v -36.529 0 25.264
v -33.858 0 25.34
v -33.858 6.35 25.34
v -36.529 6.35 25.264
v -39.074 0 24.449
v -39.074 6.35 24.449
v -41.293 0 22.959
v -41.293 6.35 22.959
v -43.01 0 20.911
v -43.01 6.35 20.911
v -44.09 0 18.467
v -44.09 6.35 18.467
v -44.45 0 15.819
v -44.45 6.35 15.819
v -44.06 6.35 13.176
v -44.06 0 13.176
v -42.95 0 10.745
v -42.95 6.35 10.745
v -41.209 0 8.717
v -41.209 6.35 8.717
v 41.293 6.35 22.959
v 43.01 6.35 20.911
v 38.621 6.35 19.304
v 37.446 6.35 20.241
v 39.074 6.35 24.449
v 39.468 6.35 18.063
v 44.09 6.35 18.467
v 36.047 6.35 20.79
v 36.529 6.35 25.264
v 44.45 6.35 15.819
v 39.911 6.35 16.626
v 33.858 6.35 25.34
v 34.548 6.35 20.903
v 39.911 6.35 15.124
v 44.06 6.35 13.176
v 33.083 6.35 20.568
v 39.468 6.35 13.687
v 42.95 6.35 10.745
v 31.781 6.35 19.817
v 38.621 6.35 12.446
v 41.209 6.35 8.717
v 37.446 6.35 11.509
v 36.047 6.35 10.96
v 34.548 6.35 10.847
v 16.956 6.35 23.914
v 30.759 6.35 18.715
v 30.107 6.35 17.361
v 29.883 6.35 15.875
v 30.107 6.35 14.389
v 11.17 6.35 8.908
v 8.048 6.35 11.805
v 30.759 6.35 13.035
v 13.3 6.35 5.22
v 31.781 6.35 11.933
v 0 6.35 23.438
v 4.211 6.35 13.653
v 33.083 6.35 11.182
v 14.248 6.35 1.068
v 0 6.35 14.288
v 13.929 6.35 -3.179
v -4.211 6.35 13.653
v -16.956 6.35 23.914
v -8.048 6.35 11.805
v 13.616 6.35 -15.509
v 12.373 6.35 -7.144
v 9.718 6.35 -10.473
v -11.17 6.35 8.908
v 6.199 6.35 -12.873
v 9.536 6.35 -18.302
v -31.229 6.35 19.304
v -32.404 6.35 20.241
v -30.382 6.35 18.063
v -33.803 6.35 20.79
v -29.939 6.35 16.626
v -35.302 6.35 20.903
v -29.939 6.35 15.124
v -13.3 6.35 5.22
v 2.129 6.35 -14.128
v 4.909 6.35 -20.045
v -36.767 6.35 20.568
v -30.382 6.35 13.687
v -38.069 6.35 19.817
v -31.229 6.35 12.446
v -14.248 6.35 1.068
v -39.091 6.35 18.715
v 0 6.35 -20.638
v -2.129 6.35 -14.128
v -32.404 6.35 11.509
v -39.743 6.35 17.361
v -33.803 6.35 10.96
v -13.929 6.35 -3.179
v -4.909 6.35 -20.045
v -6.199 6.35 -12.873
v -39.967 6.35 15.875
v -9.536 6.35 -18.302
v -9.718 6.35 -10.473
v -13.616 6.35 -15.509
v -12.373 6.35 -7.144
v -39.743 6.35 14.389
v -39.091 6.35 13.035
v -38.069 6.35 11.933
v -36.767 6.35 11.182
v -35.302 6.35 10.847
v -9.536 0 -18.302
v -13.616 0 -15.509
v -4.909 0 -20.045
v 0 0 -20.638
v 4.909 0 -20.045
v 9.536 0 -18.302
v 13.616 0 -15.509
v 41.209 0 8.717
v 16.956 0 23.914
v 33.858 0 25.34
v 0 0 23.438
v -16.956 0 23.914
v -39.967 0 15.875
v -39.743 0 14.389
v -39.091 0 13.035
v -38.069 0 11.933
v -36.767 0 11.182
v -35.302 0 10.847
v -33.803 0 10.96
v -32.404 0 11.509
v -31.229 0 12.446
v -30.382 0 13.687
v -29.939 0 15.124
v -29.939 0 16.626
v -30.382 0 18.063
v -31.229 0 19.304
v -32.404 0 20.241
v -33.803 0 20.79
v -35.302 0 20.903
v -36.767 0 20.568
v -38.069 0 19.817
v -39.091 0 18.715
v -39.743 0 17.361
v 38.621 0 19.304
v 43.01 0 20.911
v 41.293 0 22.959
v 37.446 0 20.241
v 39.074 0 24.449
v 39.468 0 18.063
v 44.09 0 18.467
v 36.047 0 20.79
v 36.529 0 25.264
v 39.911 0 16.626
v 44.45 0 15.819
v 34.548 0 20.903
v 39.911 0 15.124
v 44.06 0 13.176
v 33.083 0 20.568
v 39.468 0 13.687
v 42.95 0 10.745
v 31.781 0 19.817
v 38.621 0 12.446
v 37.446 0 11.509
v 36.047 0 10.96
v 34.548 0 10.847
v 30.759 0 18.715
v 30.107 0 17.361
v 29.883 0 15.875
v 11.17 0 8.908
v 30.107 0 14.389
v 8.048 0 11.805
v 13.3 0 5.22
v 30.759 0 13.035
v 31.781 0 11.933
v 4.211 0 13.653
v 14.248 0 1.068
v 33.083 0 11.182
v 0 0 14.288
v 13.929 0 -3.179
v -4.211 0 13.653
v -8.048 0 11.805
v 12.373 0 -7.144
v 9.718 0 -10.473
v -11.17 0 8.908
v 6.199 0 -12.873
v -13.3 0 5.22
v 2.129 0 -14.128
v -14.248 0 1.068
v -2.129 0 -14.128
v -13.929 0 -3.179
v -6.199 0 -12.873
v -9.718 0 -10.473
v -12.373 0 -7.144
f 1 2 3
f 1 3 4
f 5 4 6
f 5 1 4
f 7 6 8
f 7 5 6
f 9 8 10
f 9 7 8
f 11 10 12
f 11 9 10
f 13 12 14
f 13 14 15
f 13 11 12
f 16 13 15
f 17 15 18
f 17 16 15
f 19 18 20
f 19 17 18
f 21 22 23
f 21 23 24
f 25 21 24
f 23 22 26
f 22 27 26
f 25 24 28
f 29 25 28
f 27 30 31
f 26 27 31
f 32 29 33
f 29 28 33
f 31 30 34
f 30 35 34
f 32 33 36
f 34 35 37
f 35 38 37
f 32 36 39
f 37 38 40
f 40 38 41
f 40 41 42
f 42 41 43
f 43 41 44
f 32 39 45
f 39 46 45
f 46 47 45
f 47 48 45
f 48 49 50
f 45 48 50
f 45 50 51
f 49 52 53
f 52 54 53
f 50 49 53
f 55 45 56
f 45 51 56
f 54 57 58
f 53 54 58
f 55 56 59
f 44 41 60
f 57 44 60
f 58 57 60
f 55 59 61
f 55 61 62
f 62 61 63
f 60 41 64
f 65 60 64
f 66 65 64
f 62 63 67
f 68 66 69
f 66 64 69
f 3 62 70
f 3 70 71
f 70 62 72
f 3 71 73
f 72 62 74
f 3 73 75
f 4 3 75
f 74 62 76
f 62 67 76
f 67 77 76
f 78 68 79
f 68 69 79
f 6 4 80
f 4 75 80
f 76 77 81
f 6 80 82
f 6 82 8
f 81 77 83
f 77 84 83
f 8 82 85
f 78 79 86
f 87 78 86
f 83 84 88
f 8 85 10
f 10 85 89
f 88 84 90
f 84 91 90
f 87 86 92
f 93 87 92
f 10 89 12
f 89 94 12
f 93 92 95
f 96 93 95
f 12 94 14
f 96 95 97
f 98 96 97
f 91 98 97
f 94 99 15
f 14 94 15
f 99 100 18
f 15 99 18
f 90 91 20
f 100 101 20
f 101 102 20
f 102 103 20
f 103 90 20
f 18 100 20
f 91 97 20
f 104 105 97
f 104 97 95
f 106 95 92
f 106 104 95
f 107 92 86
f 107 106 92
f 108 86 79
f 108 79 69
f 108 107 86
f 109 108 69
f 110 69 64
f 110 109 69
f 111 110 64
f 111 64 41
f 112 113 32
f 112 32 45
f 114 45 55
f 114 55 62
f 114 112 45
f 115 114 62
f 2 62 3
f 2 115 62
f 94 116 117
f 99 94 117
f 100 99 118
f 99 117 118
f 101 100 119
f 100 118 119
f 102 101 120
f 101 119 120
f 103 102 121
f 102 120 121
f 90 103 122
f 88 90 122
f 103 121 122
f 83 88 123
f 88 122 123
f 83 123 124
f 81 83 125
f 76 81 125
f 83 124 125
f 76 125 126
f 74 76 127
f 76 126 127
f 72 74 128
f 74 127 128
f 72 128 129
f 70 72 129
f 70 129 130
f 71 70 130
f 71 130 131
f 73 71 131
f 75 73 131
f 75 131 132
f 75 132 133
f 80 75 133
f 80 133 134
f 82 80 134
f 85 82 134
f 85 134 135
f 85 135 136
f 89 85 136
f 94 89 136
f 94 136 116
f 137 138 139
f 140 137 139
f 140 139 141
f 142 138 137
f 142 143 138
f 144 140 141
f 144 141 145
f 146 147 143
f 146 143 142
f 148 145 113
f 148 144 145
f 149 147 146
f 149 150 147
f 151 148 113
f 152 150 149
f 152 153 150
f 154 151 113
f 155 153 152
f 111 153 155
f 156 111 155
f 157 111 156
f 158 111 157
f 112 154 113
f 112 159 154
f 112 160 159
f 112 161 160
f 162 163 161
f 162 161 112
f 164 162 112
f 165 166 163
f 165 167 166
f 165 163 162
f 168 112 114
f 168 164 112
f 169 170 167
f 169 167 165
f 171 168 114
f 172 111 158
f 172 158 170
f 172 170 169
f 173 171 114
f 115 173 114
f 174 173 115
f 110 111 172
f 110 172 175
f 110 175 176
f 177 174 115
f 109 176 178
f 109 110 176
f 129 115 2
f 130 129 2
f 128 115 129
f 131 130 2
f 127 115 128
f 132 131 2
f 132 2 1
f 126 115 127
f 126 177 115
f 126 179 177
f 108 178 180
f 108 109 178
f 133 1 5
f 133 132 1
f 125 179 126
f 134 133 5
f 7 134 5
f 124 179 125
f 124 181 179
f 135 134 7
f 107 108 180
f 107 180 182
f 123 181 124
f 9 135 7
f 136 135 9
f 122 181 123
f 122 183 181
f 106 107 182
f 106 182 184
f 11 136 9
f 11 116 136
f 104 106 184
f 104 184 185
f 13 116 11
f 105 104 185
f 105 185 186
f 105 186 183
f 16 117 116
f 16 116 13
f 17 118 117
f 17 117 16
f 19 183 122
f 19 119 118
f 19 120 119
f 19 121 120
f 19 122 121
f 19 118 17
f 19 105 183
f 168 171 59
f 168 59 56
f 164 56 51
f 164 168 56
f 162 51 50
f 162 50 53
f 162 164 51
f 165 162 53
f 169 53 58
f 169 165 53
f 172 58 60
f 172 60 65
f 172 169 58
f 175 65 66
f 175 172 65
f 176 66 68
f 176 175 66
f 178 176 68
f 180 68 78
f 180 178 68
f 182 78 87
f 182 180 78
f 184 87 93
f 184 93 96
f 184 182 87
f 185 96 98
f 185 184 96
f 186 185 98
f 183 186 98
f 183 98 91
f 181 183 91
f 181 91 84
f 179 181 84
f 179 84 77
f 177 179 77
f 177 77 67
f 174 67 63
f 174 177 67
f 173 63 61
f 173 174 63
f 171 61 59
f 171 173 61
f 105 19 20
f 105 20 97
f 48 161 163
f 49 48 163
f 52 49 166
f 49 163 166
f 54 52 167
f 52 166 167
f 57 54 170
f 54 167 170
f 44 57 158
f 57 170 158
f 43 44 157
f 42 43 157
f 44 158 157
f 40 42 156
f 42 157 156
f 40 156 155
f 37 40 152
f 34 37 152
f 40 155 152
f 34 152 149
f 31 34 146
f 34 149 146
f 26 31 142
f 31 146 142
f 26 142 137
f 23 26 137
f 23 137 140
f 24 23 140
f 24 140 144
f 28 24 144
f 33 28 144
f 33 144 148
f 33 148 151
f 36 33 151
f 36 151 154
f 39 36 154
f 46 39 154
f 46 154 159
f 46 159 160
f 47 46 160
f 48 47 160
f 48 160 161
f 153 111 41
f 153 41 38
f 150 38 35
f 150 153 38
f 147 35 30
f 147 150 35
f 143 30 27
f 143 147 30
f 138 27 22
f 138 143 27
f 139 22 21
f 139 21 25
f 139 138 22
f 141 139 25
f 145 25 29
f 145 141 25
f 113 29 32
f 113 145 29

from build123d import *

# Parameters (mm, degrees)
SKETCH1_R               = 14.2875
BOSS_EXTRUDE1_DEPTH     = 6.35
F_3_8_CLEARANCE_HOLE1_D = 10.0838


with BuildPart() as part:
    # Sketch1 → Boss-Extrude1 (new body)
    with BuildSketch(Plane(origin=(0, 0, 0), x_dir=(1, 0, 0), z_dir=(0, 1, 0))):
        with BuildLine():
            Line((-41.209227539, -8.717199414), (-13.615826335, 15.508567937))
            ThreePointArc((-13.615826335, 15.508567937), (0, 20.6375), (13.615826335, 15.508567937))
            Line((13.615826335, 15.508567937), (41.209227539, -8.717199414))
            ThreePointArc((41.209227539, -8.717199414), (43.636188178, -19.727379203), (33.858044807, -25.340053176))
            ThreePointArc((33.858044807, -25.340053176), (0, -23.437740611), (-33.858044807, -25.340053176))
            ThreePointArc((-33.858044807, -25.340053176), (-43.636188178, -19.727379203), (-41.209227539, -8.717199414))
        make_face()
        with Locations(Location((0, 0, 0), (0, 0, 270))):
            Circle(SKETCH1_R, mode=Mode.SUBTRACT)
    extrude(amount=BOSS_EXTRUDE1_DEPTH)

    # 3/8 Clearance Hole1 (through all)
    with Locations(Plane(origin=(0, 6.35, 0), x_dir=(1, 0, 0), z_dir=(0, 1, 0))):
        with Locations((-34.925, -15.875), (34.925, -15.875)):
            Hole(F_3_8_CLEARANCE_HOLE1_D / 2)


solid = part.part
